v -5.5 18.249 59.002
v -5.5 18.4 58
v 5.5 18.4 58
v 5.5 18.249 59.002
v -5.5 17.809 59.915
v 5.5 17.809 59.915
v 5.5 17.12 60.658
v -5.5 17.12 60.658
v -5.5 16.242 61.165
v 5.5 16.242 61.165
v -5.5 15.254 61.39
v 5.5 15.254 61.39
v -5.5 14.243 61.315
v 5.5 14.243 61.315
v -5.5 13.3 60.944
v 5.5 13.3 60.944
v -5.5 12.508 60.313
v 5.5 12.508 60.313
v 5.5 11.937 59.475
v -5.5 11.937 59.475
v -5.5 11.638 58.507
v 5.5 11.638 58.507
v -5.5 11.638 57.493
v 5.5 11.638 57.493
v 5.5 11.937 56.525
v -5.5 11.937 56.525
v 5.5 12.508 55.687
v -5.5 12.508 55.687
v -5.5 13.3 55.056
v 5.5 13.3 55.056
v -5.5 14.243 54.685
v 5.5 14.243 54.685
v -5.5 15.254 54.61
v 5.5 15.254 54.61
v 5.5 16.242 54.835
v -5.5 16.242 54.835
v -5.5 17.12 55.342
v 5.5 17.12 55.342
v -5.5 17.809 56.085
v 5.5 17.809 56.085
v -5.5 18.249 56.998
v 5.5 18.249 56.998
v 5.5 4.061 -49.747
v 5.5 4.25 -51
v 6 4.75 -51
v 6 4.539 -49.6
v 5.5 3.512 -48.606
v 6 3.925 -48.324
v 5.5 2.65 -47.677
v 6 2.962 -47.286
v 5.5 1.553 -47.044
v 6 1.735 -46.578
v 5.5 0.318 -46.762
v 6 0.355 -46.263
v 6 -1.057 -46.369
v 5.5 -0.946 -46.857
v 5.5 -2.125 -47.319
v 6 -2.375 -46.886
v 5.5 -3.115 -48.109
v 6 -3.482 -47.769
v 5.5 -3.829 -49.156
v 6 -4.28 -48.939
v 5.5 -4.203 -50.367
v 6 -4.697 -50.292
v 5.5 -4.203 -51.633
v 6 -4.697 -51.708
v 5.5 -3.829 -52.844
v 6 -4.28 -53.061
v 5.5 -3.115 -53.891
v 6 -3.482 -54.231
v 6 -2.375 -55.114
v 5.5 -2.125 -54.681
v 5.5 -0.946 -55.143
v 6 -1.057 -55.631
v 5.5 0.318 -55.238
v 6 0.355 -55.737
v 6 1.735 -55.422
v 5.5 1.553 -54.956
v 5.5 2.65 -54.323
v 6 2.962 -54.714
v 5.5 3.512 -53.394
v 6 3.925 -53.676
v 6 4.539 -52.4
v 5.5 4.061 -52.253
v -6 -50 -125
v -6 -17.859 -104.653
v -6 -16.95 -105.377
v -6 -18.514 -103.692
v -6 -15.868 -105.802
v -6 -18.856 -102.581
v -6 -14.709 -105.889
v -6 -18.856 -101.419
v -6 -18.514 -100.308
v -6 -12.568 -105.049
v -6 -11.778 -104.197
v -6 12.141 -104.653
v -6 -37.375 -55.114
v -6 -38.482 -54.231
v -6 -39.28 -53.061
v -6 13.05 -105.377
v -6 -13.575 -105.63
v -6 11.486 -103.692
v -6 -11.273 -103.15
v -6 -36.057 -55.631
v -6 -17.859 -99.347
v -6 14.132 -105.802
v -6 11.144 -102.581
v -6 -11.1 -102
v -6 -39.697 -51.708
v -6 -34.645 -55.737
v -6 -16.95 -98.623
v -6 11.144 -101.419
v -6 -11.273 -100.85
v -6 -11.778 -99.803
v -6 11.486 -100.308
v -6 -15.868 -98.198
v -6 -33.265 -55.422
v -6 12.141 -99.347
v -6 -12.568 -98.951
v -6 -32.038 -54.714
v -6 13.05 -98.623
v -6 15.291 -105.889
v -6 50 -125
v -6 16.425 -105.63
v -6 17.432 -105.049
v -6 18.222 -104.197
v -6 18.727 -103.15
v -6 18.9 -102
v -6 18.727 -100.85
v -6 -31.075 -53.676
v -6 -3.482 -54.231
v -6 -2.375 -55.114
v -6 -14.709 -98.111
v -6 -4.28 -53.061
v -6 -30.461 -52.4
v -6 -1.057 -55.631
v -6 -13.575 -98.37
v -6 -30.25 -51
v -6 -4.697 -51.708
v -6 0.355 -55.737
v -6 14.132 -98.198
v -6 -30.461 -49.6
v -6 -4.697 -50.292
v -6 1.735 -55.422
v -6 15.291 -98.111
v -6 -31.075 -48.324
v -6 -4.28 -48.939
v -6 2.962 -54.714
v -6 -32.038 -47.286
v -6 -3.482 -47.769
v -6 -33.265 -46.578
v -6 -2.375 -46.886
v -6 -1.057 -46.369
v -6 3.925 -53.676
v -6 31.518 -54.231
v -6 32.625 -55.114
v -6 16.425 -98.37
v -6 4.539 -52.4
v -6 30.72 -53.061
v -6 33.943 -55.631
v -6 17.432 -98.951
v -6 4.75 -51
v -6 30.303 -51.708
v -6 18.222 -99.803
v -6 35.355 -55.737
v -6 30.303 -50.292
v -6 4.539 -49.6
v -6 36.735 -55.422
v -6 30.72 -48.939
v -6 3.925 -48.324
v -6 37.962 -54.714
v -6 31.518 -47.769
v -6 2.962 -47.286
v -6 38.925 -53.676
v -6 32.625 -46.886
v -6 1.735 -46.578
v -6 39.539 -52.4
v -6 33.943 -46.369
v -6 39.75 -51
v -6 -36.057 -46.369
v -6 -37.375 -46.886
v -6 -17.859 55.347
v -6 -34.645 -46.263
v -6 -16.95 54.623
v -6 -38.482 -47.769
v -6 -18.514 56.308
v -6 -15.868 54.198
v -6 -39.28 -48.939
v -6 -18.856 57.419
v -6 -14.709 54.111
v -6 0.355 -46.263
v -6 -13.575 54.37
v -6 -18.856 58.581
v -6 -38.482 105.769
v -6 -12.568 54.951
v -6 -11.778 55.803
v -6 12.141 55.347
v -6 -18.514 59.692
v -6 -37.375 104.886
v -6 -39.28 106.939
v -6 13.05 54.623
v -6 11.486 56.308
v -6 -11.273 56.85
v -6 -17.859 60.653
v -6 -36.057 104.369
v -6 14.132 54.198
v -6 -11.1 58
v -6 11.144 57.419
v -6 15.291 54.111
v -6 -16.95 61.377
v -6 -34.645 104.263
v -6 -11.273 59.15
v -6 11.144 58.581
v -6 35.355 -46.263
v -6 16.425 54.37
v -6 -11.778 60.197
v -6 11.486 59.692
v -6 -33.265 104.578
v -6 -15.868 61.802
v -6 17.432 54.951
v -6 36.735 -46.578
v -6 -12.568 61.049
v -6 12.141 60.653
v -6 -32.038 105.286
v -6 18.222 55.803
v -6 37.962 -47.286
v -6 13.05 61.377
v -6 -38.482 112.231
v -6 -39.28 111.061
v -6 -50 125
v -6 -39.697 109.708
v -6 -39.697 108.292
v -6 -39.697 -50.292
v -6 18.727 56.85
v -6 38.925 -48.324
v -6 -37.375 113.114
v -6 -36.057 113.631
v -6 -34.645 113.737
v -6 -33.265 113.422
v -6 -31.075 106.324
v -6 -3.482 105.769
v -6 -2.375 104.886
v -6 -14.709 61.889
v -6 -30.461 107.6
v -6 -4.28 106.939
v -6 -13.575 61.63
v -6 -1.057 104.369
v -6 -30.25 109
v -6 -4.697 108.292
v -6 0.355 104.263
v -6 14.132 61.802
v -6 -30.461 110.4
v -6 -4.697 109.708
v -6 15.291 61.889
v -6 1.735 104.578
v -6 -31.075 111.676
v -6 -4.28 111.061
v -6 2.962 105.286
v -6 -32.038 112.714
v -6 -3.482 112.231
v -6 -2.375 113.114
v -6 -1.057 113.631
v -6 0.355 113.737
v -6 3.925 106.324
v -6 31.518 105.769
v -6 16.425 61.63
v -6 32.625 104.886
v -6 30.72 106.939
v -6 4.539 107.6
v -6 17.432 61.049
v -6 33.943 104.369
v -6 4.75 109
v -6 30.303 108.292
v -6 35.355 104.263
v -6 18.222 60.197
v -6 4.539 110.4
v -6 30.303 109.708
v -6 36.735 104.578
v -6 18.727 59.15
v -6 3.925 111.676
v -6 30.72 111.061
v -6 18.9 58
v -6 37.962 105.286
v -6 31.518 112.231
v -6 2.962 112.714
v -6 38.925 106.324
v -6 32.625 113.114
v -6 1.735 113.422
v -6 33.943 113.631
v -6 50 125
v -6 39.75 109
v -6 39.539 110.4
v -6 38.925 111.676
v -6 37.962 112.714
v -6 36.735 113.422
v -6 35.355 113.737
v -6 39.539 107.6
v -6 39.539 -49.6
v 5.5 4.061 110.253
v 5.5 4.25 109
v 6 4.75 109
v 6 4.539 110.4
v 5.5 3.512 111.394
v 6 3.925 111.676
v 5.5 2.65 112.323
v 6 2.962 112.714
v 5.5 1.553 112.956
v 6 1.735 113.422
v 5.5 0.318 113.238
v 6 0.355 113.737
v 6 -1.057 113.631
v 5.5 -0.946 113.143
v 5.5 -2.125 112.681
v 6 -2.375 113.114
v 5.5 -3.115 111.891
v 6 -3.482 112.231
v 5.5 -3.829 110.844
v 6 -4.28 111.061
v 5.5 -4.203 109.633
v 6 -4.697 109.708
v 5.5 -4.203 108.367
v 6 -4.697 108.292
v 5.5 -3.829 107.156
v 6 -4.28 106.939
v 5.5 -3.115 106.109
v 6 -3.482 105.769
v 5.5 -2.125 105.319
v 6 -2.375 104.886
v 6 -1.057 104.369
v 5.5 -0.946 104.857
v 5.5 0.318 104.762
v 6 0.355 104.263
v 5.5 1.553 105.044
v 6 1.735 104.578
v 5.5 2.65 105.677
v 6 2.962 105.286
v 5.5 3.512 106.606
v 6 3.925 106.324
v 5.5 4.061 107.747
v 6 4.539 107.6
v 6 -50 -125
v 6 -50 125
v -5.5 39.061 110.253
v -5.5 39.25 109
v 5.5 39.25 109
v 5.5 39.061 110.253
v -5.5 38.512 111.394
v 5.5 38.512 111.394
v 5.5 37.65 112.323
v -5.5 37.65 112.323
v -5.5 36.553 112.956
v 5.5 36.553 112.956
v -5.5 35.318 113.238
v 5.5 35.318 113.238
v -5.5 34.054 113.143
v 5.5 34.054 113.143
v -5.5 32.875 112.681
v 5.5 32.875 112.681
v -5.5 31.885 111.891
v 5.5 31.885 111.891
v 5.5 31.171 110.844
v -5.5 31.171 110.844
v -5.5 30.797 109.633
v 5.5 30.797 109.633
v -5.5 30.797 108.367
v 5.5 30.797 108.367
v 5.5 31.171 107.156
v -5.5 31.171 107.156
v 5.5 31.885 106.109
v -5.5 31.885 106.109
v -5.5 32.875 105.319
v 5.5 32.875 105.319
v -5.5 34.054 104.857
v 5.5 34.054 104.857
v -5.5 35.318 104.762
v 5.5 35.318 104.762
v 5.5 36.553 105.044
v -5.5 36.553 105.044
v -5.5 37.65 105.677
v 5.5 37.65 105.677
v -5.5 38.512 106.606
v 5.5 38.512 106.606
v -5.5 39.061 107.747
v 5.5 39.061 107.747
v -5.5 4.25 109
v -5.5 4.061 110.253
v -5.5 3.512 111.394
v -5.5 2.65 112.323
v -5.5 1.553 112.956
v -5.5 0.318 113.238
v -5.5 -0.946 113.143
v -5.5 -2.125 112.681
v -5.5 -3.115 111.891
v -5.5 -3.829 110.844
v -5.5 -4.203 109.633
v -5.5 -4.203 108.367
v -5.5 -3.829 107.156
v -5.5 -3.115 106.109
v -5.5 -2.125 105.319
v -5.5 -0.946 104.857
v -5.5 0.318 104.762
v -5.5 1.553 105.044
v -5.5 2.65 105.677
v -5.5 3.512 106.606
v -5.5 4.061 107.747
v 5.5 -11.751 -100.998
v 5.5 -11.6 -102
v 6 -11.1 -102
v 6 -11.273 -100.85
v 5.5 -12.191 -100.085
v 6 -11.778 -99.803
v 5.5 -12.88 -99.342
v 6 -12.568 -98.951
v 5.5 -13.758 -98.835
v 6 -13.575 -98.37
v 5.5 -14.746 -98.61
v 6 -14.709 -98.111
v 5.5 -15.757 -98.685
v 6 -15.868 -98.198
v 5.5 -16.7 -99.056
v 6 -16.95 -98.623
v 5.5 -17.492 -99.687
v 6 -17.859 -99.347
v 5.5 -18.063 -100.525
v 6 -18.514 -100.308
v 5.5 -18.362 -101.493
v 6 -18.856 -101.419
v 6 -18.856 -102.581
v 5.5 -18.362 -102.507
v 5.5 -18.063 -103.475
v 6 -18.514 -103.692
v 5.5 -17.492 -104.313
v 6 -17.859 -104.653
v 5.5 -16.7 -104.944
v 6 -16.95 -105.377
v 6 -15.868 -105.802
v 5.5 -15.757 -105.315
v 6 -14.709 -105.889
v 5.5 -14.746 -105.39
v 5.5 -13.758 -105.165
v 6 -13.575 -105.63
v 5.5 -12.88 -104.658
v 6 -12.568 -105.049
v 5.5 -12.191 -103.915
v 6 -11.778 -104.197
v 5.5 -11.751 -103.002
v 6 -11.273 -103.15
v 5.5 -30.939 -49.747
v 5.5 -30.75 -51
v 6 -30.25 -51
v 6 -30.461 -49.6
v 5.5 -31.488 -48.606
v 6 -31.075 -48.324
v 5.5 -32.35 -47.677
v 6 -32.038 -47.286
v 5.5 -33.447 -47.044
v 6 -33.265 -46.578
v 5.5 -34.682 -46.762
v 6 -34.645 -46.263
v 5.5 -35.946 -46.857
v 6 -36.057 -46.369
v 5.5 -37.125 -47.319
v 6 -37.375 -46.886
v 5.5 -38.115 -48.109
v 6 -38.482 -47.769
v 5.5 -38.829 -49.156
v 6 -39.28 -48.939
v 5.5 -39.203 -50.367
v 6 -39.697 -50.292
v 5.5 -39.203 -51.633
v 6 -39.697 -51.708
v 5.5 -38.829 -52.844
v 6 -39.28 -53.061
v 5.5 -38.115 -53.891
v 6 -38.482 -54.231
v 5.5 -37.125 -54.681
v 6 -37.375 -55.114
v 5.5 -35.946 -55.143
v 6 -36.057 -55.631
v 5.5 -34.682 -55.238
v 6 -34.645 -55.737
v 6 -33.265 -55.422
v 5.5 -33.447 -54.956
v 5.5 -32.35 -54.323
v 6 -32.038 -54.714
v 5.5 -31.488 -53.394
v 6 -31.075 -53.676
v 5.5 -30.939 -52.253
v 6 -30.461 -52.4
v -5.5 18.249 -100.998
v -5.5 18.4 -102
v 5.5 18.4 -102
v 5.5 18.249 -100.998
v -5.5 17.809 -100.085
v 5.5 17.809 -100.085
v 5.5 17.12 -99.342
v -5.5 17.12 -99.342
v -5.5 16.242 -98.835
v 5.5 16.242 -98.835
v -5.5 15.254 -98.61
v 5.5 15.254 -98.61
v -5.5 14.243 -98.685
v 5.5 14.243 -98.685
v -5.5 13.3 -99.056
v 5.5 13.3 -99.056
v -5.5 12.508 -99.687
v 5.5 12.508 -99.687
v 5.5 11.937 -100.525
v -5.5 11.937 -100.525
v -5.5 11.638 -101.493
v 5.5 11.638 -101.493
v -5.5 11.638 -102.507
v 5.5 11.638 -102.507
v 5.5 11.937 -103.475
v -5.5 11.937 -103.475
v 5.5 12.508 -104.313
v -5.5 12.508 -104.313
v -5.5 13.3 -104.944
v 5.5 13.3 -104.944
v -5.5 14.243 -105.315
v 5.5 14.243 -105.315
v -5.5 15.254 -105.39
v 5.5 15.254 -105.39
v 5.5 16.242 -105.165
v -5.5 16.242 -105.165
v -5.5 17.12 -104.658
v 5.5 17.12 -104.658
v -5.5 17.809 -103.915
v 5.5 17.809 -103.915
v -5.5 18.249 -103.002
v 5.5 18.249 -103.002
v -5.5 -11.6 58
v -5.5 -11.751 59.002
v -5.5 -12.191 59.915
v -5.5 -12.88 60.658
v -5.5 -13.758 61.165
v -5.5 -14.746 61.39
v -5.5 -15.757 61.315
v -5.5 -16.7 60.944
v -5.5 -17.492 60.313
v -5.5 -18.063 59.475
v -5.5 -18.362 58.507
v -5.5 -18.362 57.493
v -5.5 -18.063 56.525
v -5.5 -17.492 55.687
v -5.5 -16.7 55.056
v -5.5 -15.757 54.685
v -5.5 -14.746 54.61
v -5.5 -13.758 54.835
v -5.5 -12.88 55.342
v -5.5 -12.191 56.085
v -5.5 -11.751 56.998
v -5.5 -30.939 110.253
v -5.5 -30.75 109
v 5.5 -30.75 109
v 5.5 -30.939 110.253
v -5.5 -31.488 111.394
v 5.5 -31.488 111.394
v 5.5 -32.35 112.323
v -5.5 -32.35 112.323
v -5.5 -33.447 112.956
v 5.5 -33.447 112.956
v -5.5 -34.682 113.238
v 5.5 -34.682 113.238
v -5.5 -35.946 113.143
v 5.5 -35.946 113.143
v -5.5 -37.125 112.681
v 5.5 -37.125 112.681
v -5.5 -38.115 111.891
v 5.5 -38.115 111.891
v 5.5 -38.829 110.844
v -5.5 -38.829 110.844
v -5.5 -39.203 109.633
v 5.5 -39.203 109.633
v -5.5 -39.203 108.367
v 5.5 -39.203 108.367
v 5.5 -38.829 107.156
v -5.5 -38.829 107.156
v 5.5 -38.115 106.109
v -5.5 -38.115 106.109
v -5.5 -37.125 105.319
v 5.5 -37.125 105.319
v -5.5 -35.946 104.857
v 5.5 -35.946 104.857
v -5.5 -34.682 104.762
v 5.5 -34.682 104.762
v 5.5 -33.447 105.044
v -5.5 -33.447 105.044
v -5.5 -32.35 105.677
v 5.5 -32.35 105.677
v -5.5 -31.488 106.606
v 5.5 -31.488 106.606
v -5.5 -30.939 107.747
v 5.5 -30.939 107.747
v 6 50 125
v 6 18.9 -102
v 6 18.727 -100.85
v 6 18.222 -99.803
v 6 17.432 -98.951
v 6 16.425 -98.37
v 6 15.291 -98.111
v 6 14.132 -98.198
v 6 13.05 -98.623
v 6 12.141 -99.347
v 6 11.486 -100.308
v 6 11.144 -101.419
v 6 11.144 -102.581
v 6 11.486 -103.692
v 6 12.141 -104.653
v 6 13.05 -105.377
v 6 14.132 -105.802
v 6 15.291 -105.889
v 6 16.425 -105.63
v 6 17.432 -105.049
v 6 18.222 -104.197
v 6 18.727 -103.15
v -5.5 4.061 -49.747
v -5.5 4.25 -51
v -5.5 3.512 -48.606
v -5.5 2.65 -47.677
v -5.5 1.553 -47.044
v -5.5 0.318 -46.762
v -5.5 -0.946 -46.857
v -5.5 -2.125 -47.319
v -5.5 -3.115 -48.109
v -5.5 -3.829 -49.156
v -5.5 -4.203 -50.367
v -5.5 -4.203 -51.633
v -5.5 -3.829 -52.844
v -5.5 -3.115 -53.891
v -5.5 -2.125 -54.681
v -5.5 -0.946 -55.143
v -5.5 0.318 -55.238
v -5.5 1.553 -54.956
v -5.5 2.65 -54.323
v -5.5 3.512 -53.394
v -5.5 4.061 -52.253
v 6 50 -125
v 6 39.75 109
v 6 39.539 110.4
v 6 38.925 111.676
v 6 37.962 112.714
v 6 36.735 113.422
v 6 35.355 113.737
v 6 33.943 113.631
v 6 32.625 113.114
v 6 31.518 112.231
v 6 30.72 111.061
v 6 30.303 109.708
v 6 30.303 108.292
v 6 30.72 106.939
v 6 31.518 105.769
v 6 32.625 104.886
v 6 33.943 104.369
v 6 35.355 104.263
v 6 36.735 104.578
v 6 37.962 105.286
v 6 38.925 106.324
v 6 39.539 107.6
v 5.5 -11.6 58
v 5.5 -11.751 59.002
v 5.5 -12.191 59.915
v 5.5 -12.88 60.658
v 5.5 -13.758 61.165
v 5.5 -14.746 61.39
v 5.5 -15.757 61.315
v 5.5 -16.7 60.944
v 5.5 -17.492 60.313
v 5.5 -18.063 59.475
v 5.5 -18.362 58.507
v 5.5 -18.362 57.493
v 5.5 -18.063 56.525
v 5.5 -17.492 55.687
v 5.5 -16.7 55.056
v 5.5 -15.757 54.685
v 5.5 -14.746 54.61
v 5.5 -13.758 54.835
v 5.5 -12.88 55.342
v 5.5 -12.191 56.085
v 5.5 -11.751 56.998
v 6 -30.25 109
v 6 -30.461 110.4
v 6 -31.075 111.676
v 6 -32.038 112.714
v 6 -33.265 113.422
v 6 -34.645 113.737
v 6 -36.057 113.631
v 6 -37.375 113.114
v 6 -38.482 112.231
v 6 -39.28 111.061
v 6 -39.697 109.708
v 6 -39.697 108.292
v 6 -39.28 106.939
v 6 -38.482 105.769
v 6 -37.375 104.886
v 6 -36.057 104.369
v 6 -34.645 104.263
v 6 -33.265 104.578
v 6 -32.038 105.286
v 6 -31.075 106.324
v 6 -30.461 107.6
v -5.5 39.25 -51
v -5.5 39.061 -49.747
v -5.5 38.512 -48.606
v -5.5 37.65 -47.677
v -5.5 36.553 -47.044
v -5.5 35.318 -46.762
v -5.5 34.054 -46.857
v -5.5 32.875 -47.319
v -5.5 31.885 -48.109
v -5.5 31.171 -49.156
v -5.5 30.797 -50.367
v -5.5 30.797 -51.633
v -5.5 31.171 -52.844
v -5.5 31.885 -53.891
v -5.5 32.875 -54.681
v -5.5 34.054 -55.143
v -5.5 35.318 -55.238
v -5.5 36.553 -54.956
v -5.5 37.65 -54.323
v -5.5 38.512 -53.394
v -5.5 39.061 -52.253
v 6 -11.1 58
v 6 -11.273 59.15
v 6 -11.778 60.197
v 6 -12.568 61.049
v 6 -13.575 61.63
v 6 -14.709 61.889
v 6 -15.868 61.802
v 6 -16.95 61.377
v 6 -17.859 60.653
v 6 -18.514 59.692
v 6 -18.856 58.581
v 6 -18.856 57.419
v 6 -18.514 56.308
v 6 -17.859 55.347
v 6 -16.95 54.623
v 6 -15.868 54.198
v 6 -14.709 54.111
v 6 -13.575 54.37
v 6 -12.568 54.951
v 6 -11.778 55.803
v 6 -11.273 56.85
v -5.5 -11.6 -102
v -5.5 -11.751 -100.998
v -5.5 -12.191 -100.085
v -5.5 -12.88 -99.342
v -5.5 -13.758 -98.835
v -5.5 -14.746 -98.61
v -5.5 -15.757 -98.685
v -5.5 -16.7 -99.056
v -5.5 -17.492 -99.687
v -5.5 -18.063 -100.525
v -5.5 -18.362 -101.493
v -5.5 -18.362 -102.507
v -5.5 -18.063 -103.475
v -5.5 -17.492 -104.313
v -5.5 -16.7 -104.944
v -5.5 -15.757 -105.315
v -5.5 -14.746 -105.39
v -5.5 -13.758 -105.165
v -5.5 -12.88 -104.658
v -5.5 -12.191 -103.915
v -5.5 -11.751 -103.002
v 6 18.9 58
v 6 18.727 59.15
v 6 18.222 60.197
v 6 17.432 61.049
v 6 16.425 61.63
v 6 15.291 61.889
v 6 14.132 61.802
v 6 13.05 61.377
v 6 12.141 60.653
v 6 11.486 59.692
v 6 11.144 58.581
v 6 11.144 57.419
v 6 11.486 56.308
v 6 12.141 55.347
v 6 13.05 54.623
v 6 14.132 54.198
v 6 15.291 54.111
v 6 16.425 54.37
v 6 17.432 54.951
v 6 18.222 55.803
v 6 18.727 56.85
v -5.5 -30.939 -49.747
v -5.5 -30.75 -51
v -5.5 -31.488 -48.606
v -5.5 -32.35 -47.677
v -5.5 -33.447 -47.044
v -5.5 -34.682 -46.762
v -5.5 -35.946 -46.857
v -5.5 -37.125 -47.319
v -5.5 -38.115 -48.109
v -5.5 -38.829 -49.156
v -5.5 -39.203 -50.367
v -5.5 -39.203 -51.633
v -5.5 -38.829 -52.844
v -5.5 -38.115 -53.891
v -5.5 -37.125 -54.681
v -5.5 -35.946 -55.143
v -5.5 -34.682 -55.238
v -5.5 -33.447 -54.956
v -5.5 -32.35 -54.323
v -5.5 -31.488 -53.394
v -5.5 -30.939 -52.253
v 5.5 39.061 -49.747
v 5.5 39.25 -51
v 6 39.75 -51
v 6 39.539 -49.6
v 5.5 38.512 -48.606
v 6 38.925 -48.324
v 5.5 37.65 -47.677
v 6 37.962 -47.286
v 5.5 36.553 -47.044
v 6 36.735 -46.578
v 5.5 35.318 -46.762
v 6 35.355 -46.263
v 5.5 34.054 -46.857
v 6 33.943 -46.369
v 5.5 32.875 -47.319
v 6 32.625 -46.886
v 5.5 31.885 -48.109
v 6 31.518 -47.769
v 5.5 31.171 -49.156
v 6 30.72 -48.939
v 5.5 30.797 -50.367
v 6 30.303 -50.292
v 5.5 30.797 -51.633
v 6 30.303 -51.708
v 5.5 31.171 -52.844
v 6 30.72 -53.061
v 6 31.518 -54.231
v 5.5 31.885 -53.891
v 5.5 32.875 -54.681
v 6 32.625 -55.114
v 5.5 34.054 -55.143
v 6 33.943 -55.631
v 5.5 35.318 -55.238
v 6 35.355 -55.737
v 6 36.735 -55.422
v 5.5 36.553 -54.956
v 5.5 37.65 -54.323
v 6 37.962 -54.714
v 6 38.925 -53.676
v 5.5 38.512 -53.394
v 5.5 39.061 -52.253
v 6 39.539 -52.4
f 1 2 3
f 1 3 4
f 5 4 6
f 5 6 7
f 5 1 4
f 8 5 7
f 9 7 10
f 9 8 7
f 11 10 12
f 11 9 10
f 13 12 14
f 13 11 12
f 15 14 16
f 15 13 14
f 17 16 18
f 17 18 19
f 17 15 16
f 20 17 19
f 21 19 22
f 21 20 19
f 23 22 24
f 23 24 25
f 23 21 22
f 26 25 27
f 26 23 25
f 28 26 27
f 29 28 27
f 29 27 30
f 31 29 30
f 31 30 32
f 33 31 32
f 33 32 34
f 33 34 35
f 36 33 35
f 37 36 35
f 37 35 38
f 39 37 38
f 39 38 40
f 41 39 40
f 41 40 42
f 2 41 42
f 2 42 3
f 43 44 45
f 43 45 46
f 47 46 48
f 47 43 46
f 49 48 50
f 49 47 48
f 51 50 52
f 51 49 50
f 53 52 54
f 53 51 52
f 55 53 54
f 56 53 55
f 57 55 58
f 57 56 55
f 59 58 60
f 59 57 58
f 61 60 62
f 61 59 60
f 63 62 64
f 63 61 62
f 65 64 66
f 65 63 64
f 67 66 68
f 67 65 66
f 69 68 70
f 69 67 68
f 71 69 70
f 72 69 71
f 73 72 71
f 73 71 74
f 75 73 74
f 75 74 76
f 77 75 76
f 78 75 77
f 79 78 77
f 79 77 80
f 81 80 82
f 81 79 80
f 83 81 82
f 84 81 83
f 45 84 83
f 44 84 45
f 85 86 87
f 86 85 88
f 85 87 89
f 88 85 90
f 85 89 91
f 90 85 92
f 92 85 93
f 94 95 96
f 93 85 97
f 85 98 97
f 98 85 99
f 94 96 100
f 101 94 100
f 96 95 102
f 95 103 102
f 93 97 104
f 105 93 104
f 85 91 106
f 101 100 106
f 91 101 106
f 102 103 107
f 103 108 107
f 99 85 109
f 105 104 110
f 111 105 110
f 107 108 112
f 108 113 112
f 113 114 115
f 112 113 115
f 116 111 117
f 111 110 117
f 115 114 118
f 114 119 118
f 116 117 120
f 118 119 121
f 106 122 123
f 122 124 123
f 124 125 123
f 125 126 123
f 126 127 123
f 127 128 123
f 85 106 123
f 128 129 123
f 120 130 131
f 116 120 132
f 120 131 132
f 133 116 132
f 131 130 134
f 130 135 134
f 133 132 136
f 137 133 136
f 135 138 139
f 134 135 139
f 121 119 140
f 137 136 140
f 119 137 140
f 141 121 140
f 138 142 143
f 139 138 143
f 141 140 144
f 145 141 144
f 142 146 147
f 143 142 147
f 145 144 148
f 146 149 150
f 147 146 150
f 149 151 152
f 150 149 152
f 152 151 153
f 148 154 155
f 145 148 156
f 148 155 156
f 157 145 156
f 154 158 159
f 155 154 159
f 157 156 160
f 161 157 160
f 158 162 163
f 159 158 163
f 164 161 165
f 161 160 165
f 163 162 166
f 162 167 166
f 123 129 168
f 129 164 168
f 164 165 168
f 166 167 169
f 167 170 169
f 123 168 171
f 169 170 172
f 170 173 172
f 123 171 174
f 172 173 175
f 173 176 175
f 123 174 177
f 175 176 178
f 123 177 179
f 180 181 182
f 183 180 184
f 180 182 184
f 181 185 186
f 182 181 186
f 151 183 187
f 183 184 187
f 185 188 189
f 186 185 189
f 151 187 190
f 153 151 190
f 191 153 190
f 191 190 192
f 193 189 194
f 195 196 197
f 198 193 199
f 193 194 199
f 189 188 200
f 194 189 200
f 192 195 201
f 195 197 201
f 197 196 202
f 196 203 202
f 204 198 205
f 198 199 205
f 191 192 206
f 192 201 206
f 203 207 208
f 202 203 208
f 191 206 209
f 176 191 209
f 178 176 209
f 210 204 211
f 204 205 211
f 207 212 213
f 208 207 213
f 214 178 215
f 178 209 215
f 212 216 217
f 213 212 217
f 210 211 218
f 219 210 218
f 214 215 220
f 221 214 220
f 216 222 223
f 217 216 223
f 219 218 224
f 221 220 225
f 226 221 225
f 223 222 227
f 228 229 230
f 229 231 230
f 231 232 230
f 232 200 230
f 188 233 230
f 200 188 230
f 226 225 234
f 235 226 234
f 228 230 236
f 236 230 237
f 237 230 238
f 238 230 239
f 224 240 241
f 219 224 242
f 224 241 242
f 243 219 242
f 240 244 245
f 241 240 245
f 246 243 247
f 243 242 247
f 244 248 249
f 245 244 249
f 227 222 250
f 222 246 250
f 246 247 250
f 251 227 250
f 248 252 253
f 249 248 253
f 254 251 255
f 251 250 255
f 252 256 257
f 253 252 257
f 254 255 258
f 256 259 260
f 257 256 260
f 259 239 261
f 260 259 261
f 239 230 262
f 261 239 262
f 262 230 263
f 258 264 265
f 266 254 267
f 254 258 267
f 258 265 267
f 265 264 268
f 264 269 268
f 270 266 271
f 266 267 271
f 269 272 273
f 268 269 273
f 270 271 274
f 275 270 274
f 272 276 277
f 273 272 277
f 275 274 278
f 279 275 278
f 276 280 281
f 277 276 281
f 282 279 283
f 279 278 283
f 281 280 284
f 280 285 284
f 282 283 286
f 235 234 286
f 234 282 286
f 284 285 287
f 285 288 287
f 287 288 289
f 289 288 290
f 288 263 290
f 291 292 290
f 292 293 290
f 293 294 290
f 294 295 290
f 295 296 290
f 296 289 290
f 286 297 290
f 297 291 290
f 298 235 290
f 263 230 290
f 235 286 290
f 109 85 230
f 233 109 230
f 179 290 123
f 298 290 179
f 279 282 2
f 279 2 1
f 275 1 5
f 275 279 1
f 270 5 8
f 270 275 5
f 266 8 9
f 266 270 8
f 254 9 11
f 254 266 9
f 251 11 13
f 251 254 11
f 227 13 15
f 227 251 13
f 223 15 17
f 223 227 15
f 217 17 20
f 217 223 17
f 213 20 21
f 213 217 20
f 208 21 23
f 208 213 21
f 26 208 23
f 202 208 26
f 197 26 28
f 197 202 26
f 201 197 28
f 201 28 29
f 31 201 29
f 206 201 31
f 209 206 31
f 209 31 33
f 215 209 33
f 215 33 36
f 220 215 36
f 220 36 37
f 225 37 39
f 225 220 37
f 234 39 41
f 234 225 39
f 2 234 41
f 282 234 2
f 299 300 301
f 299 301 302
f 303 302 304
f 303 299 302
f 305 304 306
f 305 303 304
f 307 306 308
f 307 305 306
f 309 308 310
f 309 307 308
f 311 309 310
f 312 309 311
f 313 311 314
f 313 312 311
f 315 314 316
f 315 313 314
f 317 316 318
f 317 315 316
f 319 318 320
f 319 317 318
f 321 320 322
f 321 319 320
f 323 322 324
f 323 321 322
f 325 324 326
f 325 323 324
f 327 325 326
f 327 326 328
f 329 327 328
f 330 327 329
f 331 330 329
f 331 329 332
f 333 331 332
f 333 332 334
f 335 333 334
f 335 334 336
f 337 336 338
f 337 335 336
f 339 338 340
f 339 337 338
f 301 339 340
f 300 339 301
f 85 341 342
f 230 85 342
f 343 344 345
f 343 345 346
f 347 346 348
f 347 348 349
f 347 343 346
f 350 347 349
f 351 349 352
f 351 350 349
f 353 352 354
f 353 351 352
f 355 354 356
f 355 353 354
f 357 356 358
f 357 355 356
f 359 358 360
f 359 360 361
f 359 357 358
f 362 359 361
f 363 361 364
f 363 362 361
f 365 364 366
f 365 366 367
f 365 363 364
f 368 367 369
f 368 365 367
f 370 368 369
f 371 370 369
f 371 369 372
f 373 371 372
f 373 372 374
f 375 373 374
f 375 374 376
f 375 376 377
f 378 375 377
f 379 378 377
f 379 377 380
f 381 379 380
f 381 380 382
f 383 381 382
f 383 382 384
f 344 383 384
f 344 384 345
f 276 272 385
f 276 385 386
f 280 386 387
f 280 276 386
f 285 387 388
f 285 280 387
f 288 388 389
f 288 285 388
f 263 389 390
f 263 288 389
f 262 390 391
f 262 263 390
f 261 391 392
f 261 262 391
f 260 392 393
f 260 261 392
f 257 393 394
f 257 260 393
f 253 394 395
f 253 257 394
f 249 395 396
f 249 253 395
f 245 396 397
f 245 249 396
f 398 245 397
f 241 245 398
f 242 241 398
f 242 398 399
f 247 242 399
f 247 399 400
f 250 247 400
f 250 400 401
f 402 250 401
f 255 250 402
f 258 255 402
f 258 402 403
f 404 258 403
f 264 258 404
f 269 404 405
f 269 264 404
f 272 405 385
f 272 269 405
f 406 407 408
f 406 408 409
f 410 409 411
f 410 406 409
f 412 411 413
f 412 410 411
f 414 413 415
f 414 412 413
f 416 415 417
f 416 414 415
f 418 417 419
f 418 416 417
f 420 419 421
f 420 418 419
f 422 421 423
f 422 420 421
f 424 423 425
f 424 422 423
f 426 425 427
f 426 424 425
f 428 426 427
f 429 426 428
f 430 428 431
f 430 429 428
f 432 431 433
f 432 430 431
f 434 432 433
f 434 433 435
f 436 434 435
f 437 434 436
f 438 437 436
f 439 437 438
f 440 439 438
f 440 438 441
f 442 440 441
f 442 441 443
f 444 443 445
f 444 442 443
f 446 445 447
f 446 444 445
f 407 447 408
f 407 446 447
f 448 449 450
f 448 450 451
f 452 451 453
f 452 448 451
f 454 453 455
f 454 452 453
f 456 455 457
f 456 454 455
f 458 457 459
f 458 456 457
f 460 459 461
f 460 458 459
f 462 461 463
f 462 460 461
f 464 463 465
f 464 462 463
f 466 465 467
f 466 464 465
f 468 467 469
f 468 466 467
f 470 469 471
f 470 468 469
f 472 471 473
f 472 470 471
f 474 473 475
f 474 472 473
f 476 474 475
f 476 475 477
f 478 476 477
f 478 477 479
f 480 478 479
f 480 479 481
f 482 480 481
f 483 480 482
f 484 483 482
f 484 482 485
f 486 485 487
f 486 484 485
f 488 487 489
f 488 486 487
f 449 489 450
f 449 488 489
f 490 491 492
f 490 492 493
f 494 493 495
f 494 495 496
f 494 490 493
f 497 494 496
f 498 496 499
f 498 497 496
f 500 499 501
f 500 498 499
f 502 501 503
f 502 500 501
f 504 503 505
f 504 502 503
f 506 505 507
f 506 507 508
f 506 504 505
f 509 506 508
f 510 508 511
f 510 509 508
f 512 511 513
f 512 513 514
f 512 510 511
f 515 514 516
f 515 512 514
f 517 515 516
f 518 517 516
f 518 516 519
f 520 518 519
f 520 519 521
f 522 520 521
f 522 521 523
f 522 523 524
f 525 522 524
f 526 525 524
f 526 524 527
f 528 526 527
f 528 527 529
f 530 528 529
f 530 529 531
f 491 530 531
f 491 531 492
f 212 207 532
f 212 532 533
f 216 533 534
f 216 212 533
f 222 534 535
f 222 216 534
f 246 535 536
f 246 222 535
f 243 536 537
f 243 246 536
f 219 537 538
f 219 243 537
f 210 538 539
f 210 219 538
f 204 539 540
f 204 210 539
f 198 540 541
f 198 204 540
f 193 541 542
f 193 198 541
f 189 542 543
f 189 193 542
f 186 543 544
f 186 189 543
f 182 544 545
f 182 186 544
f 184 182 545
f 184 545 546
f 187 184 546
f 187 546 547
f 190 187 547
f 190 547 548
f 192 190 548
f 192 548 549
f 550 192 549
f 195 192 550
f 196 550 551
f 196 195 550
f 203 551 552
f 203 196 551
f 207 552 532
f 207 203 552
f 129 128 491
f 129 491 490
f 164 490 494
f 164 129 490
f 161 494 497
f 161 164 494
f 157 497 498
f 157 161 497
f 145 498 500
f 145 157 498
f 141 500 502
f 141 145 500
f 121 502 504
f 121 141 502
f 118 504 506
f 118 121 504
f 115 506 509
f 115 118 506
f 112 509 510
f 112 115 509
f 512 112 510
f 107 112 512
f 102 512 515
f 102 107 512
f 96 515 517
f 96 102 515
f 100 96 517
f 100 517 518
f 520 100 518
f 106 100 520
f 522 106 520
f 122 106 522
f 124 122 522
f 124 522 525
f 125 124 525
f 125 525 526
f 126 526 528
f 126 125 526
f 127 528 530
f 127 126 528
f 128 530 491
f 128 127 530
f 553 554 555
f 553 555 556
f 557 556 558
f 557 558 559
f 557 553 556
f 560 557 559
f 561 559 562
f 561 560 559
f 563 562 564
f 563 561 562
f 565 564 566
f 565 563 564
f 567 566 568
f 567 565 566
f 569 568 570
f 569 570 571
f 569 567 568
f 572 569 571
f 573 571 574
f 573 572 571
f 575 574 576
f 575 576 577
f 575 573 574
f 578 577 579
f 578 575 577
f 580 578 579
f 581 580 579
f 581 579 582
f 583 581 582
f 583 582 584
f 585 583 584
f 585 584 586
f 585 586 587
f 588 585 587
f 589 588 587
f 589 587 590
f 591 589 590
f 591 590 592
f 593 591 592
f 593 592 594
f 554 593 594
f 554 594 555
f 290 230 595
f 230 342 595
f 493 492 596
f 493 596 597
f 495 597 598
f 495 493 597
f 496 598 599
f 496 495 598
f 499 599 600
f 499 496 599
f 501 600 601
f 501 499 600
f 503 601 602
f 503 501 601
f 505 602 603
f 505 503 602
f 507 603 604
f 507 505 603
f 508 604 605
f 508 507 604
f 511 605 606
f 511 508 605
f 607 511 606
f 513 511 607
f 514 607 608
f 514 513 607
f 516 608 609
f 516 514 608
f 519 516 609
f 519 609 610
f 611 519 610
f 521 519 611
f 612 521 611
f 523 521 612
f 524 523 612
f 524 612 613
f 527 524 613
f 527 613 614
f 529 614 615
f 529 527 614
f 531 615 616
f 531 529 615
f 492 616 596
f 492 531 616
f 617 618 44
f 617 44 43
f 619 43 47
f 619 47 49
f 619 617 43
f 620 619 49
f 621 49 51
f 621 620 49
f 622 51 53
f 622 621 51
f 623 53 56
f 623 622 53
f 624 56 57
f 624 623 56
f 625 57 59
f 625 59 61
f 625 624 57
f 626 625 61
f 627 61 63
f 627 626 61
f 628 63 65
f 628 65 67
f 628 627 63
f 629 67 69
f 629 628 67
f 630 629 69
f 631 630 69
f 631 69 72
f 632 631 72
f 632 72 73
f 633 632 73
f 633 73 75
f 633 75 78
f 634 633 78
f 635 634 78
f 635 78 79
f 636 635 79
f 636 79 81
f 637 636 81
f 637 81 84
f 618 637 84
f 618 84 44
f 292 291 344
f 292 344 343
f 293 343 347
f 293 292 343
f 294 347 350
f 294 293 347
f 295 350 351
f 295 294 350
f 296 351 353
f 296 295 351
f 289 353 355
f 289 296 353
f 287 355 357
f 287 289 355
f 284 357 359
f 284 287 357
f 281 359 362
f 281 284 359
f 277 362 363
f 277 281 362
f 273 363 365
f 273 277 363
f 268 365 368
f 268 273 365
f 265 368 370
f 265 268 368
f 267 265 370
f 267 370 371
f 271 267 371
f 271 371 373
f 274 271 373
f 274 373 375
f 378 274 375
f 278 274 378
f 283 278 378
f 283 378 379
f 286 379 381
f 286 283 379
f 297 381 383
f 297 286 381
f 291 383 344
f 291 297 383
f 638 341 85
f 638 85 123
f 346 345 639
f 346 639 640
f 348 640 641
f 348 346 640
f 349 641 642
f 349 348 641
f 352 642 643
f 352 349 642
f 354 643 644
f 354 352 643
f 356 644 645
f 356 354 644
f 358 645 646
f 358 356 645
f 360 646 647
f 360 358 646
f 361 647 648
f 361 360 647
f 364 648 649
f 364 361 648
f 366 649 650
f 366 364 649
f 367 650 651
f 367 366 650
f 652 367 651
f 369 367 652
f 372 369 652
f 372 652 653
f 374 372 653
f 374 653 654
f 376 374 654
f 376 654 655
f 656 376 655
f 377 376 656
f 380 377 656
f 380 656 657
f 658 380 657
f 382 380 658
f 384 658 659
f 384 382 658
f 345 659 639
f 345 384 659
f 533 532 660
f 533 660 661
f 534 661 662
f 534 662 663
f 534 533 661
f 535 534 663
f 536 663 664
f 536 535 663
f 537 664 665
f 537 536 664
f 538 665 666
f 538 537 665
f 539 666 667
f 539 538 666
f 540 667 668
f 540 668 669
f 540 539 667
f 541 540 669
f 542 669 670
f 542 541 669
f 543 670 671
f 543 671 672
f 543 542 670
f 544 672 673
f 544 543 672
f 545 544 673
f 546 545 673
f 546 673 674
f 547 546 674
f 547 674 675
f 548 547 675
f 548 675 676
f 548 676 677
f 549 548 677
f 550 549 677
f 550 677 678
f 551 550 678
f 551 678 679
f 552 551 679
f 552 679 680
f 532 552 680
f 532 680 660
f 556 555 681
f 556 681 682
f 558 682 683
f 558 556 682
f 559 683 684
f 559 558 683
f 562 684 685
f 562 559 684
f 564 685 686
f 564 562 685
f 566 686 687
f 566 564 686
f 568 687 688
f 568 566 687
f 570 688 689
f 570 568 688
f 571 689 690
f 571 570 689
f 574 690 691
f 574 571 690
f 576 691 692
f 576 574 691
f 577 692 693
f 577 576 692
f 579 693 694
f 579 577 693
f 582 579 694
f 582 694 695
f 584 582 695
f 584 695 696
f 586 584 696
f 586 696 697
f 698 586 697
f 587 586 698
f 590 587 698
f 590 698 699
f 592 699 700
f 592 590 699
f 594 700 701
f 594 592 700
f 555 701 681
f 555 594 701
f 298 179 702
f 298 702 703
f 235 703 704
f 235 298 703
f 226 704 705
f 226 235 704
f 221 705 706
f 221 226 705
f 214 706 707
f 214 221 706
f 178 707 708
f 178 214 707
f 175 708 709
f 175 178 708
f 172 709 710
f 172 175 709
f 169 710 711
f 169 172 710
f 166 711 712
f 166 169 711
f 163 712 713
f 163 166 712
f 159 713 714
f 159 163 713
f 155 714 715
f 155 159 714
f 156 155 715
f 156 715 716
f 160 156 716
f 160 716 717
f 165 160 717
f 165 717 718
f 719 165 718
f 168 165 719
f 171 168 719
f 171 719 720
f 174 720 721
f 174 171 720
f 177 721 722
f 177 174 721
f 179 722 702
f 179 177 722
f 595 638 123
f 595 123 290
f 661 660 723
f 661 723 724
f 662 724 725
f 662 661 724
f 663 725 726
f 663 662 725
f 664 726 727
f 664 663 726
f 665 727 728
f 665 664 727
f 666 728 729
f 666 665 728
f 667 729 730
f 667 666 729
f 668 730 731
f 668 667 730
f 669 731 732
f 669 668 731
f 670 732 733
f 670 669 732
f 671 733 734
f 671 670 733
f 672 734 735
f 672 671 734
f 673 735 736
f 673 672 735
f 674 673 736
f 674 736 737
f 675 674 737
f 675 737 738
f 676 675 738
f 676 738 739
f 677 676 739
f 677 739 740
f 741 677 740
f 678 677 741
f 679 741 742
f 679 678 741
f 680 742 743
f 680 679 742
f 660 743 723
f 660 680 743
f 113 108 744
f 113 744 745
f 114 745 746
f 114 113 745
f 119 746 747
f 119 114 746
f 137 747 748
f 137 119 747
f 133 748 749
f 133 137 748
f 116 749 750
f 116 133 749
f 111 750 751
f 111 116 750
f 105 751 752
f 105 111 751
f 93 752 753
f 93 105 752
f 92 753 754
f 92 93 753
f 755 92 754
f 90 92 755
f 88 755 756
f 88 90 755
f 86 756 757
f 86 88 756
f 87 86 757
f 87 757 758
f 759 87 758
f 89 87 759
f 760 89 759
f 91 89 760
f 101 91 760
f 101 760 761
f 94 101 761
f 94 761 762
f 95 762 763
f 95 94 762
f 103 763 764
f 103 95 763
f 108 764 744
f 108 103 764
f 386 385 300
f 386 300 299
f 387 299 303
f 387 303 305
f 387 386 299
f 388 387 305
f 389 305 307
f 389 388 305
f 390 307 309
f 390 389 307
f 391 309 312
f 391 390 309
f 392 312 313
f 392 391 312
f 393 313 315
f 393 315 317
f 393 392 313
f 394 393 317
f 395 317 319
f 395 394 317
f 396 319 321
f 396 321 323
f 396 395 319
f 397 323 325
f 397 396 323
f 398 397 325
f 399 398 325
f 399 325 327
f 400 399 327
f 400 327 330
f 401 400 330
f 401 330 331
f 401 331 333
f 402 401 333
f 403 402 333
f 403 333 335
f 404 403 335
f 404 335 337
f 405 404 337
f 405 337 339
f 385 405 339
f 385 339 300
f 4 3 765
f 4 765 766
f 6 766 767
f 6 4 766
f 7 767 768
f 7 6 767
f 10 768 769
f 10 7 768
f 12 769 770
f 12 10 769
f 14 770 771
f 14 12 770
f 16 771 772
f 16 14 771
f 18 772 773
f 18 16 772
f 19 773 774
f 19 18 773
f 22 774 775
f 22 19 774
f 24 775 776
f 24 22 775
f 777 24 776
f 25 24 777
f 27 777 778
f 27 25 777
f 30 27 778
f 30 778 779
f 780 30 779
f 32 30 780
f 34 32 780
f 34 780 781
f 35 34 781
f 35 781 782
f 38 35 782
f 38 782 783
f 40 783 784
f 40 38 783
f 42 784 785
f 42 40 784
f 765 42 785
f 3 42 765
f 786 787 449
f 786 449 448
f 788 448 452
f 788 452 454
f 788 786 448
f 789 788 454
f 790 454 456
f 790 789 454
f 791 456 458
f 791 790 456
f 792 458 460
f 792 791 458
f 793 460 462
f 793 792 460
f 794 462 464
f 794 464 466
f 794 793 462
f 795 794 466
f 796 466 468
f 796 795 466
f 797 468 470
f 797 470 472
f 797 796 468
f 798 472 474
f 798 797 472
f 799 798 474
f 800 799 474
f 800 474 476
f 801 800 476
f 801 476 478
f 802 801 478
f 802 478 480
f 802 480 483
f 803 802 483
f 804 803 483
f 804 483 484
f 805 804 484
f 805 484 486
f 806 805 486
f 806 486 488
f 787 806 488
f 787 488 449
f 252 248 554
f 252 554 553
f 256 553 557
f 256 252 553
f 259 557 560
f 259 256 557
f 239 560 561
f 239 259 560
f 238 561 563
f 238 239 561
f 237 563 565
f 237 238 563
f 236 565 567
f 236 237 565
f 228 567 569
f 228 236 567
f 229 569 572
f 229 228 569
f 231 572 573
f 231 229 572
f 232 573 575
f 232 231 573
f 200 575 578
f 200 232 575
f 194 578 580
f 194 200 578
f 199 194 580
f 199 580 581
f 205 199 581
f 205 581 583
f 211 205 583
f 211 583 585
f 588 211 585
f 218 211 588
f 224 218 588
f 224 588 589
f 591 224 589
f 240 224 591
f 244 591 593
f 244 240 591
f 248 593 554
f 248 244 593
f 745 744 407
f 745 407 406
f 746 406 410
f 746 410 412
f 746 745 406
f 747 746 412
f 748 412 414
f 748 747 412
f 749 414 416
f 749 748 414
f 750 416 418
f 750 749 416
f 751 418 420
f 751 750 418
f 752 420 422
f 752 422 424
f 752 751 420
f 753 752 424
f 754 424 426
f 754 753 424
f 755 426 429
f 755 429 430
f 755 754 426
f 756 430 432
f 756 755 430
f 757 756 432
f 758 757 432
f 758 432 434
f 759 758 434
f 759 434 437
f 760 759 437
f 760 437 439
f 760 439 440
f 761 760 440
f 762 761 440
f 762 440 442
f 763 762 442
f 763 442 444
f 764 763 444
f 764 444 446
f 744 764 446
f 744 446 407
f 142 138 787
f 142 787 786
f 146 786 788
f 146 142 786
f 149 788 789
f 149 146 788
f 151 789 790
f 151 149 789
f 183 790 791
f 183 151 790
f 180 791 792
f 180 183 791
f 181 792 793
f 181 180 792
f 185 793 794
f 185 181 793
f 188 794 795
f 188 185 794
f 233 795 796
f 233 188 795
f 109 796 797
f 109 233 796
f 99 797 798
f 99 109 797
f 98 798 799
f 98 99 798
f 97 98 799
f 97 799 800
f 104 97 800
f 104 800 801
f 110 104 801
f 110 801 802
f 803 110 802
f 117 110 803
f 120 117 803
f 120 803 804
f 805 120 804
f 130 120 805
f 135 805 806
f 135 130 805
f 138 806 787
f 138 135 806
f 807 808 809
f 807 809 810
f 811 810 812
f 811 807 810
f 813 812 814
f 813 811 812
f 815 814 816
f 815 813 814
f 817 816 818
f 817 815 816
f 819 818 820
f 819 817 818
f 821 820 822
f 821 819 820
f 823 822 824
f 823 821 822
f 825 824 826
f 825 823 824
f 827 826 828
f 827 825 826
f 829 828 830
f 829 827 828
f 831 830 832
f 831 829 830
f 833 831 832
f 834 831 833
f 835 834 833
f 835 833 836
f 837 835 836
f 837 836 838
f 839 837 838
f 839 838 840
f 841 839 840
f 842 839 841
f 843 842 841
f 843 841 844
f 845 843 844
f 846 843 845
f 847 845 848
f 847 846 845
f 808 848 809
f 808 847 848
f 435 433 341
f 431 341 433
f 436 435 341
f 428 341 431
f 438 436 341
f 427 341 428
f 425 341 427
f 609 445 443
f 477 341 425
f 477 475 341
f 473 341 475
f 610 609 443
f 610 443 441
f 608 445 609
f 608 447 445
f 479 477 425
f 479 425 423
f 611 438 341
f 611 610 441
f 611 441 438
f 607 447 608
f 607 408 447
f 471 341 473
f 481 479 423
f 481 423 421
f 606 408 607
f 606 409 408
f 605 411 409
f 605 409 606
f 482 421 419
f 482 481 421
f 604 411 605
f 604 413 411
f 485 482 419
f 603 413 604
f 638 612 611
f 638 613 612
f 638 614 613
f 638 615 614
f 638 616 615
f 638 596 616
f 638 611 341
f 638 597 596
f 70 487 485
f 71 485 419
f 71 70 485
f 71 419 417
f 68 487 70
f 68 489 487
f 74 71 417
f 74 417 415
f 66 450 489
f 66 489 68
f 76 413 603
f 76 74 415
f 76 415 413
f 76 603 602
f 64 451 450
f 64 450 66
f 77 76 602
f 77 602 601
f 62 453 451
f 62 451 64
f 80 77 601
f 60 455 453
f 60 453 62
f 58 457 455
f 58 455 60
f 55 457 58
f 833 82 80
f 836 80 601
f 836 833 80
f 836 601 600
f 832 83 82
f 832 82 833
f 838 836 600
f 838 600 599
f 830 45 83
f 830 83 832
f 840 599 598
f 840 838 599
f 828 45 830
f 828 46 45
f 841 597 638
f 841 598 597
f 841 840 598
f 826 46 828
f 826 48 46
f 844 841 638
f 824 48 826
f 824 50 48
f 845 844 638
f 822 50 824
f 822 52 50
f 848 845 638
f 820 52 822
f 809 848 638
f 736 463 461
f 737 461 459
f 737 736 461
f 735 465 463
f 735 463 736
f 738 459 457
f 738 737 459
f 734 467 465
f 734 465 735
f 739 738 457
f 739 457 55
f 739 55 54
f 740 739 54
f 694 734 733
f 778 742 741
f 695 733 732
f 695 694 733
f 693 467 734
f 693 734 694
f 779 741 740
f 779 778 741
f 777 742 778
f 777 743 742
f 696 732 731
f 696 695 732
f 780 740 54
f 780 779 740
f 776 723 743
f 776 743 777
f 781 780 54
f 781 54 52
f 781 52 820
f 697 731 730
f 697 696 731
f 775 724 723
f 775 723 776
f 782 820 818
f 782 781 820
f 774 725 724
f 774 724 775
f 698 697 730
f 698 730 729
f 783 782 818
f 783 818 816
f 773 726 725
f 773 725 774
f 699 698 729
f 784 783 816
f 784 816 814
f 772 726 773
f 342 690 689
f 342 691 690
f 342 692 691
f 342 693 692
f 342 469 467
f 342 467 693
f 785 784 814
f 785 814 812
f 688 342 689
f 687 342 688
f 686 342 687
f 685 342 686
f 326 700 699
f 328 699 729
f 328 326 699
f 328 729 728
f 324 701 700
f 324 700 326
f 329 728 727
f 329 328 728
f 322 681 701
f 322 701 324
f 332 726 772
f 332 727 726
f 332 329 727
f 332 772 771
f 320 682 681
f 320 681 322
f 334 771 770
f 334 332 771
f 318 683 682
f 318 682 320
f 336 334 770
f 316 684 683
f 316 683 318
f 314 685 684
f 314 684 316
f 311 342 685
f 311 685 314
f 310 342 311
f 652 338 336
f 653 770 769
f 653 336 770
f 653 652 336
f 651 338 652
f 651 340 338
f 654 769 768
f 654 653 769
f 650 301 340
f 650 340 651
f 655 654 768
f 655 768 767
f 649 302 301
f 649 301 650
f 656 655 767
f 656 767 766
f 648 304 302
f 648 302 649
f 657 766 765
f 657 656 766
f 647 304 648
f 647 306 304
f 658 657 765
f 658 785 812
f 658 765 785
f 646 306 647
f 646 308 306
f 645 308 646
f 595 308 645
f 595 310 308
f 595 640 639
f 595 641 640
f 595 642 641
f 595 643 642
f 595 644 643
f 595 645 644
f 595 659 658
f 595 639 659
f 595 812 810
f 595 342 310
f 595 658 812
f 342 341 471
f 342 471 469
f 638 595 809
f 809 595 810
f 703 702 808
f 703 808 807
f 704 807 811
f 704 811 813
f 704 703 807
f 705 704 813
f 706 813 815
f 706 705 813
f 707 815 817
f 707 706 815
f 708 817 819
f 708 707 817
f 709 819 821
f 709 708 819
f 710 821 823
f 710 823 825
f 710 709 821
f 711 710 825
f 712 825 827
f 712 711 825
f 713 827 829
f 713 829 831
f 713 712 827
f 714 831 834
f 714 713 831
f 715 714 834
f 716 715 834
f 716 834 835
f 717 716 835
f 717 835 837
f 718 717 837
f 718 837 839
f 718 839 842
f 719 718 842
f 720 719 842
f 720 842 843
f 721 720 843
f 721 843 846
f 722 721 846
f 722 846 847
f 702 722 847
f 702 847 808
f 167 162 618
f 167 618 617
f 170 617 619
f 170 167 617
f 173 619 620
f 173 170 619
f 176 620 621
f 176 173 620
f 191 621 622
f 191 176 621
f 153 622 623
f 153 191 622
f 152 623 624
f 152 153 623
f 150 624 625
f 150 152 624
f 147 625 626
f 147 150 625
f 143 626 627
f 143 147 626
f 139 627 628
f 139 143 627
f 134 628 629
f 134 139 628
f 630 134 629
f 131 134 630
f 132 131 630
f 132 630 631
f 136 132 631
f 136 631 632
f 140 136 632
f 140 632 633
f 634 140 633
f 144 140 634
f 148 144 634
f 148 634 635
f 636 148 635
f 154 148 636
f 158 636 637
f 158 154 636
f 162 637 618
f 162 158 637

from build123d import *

# Parameters (mm, degrees)
F0_W     = 100
F0_H     = 250
F0_R     = 3.4
F0_R_2   = 4.25
F1_DEPTH = 6
F2_SIZE  = 0.5


with BuildPart() as f1:
    # F0 (on Right) → F1 (new body, symmetric)
    with BuildSketch(Plane.YZ):
        Rectangle(F0_W, F0_H)
        with Locations((-15, -102)):
            Circle(F0_R, mode=Mode.SUBTRACT)
        with Locations((-35, -51)):
            Circle(F0_R_2, mode=Mode.SUBTRACT)
        with Locations((15, -102)):
            Circle(F0_R, mode=Mode.SUBTRACT)
        with Locations((0, -51)):
            Circle(F0_R_2, mode=Mode.SUBTRACT)
        with Locations((35, -51)):
            Circle(F0_R_2, mode=Mode.SUBTRACT)
        with Locations((-15, 58)):
            Circle(F0_R, mode=Mode.SUBTRACT)
        with Locations((-35, 109)):
            Circle(F0_R_2, mode=Mode.SUBTRACT)
        with Locations((15, 58)):
            Circle(F0_R, mode=Mode.SUBTRACT)
        with Locations((0, 109)):
            Circle(F0_R_2, mode=Mode.SUBTRACT)
        with Locations((35, 109)):
            Circle(F0_R_2, mode=Mode.SUBTRACT)
    extrude(amount=F1_DEPTH, both=True)

    # F2
    f2_edges = [f1.edges().sort_by_distance(p)[0] for p in [
        (6, -39.25, 109),
        (0, -30.75, 109),
        (-6, -39.25, 109),
        (6, -4.25, 109),
        (0, 4.25, 109),
        (-6, -4.25, 109),
        (6, 30.75, 109),
        (0, 39.25, 109),
        (-6, 30.75, 109),
        (6, 30.75, -51),
        (0, 39.25, -51),
        (-6, 30.75, -51),
        (6, -4.25, -51),
        (0, 4.25, -51),
        (-6, -4.25, -51),
        (6, -39.25, -51),
        (0, -30.75, -51),
        (-6, -39.25, -51),
        (6, -18.4, 58),
        (0, -11.6, 58),
        (-6, -18.4, 58),
        (6, 11.6, 58),
        (0, 18.4, 58),
        (-6, 11.6, 58),
        (6, -18.4, -102),
        (0, -11.6, -102),
        (-6, -18.4, -102),
        (6, 11.6, -102),
        (0, 18.4, -102),
        (-6, 11.6, -102),
    ]]
    chamfer(f2_edges, length=F2_SIZE)


solid = f1.part
